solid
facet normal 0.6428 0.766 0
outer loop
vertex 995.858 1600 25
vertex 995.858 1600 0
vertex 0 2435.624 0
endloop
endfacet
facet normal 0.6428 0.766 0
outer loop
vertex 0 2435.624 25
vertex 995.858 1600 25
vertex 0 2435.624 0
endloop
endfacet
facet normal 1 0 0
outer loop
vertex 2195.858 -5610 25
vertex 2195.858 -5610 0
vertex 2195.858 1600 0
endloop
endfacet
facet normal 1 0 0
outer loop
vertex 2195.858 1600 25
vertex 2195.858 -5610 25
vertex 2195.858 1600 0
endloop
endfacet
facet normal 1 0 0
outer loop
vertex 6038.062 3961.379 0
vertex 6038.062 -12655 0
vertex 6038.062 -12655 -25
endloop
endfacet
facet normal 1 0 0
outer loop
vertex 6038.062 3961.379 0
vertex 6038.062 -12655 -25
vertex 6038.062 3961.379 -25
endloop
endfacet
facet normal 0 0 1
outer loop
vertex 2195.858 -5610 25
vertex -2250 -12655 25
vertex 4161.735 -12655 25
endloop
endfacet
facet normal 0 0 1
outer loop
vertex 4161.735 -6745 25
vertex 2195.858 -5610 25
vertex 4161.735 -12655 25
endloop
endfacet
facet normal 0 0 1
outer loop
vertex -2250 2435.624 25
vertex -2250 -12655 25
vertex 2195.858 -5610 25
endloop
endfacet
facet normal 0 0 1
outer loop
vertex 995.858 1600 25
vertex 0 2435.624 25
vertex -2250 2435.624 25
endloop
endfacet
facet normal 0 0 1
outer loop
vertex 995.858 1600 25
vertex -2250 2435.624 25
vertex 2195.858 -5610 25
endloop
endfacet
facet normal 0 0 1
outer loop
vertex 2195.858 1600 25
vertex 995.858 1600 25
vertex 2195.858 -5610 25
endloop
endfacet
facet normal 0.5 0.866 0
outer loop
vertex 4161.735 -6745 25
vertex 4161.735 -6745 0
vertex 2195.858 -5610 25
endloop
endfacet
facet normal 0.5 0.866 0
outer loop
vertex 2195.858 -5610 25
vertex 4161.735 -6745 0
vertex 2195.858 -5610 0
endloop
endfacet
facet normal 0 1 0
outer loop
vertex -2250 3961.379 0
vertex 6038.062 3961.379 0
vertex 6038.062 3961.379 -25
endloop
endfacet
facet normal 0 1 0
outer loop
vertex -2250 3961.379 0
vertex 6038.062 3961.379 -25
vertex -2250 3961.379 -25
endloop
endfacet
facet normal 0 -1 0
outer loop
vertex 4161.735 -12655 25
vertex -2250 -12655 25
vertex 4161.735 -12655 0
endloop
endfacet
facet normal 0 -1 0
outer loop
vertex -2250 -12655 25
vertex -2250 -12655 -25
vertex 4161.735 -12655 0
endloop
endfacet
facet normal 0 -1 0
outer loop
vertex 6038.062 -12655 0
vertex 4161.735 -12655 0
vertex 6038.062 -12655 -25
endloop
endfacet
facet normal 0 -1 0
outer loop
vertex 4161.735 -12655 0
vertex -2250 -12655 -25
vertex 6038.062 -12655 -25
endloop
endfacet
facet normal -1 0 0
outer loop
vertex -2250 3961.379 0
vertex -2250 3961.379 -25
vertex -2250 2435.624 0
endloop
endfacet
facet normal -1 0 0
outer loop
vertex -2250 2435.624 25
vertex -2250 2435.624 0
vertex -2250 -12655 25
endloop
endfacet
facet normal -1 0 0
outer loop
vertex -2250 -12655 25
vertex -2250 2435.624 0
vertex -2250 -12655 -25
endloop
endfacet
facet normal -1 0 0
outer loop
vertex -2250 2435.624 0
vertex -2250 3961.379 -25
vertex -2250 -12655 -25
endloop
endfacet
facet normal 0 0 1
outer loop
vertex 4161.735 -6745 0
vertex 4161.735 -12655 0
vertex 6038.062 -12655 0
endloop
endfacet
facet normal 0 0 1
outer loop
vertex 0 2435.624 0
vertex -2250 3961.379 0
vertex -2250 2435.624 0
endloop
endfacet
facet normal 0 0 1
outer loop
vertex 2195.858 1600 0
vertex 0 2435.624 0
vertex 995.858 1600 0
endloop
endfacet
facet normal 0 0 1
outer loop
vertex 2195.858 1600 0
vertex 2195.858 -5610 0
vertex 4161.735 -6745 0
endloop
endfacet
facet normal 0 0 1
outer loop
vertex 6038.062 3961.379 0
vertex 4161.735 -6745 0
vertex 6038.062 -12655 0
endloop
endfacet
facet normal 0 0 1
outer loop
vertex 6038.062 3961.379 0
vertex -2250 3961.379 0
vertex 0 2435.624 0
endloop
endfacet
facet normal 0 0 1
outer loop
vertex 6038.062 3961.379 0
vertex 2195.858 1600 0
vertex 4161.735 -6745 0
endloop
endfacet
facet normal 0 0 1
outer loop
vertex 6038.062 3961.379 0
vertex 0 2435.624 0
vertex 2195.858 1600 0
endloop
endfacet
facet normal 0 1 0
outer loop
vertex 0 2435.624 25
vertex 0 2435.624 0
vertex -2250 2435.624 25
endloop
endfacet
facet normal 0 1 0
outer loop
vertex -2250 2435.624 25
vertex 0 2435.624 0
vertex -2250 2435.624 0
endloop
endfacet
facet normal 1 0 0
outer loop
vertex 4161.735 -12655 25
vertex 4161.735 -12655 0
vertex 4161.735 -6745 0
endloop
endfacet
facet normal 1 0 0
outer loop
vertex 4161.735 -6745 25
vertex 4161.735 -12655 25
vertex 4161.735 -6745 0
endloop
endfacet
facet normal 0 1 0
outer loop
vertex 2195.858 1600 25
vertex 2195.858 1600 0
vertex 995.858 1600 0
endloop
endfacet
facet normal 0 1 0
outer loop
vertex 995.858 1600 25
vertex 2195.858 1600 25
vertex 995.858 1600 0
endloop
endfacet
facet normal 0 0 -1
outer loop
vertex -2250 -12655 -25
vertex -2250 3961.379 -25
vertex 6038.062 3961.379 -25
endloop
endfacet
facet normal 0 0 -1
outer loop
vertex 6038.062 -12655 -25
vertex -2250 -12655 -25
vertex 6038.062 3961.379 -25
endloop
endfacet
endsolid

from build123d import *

# Parameters (mm, degrees)
F3_DEPTH = 25
F5_DEPTH = 25


# Not quite as in the source:
# - the program builds the solid bodies; features that only make, move or delete a surface that nothing else refers to are left out


with BuildPart() as f3:
    # F0 (on Top) → F3 (new body)
    with BuildSketch(Plane.XY):
        Polygon((-2250, 3961.3792896271), (-2250, 2435.6238925925), (0, 2435.6238925925), (995.8577760547, 1600), (2195.8577760547, 1600), (2195.8577760547, 600), (2195.8577760547, 0), (2195.8577760547, -5610), (4161.7354426453, -6745), (4161.7354426453, -12655), (6038.0616188049, -12655), (6038.0616188049, 3961.3792896271), align=None)
        Polygon((0, 2435.6238925925), (-2250, 2435.6238925925), (-2250, -12655), (4161.7354426453, -12655), (4161.7354426453, -6745), (2195.8577760547, -5610), (2195.8577760547, 0), (2195.8577760547, 600), (2195.8577760547, 1600), (995.8577760547, 1600), align=None)
    extrude(amount=-F3_DEPTH)

    # F0 (on Top) → F5 (join)
    with BuildSketch(Plane.XY):
        Polygon((0, 2435.6238925925), (-2250, 2435.6238925925), (-2250, -12655), (4161.7354426453, -12655), (4161.7354426453, -6745), (2195.8577760547, -5610), (2195.8577760547, 0), (2195.8577760547, 600), (2195.8577760547, 1600), (995.8577760547, 1600), align=None)
    extrude(amount=F5_DEPTH)


solid = f3.part
